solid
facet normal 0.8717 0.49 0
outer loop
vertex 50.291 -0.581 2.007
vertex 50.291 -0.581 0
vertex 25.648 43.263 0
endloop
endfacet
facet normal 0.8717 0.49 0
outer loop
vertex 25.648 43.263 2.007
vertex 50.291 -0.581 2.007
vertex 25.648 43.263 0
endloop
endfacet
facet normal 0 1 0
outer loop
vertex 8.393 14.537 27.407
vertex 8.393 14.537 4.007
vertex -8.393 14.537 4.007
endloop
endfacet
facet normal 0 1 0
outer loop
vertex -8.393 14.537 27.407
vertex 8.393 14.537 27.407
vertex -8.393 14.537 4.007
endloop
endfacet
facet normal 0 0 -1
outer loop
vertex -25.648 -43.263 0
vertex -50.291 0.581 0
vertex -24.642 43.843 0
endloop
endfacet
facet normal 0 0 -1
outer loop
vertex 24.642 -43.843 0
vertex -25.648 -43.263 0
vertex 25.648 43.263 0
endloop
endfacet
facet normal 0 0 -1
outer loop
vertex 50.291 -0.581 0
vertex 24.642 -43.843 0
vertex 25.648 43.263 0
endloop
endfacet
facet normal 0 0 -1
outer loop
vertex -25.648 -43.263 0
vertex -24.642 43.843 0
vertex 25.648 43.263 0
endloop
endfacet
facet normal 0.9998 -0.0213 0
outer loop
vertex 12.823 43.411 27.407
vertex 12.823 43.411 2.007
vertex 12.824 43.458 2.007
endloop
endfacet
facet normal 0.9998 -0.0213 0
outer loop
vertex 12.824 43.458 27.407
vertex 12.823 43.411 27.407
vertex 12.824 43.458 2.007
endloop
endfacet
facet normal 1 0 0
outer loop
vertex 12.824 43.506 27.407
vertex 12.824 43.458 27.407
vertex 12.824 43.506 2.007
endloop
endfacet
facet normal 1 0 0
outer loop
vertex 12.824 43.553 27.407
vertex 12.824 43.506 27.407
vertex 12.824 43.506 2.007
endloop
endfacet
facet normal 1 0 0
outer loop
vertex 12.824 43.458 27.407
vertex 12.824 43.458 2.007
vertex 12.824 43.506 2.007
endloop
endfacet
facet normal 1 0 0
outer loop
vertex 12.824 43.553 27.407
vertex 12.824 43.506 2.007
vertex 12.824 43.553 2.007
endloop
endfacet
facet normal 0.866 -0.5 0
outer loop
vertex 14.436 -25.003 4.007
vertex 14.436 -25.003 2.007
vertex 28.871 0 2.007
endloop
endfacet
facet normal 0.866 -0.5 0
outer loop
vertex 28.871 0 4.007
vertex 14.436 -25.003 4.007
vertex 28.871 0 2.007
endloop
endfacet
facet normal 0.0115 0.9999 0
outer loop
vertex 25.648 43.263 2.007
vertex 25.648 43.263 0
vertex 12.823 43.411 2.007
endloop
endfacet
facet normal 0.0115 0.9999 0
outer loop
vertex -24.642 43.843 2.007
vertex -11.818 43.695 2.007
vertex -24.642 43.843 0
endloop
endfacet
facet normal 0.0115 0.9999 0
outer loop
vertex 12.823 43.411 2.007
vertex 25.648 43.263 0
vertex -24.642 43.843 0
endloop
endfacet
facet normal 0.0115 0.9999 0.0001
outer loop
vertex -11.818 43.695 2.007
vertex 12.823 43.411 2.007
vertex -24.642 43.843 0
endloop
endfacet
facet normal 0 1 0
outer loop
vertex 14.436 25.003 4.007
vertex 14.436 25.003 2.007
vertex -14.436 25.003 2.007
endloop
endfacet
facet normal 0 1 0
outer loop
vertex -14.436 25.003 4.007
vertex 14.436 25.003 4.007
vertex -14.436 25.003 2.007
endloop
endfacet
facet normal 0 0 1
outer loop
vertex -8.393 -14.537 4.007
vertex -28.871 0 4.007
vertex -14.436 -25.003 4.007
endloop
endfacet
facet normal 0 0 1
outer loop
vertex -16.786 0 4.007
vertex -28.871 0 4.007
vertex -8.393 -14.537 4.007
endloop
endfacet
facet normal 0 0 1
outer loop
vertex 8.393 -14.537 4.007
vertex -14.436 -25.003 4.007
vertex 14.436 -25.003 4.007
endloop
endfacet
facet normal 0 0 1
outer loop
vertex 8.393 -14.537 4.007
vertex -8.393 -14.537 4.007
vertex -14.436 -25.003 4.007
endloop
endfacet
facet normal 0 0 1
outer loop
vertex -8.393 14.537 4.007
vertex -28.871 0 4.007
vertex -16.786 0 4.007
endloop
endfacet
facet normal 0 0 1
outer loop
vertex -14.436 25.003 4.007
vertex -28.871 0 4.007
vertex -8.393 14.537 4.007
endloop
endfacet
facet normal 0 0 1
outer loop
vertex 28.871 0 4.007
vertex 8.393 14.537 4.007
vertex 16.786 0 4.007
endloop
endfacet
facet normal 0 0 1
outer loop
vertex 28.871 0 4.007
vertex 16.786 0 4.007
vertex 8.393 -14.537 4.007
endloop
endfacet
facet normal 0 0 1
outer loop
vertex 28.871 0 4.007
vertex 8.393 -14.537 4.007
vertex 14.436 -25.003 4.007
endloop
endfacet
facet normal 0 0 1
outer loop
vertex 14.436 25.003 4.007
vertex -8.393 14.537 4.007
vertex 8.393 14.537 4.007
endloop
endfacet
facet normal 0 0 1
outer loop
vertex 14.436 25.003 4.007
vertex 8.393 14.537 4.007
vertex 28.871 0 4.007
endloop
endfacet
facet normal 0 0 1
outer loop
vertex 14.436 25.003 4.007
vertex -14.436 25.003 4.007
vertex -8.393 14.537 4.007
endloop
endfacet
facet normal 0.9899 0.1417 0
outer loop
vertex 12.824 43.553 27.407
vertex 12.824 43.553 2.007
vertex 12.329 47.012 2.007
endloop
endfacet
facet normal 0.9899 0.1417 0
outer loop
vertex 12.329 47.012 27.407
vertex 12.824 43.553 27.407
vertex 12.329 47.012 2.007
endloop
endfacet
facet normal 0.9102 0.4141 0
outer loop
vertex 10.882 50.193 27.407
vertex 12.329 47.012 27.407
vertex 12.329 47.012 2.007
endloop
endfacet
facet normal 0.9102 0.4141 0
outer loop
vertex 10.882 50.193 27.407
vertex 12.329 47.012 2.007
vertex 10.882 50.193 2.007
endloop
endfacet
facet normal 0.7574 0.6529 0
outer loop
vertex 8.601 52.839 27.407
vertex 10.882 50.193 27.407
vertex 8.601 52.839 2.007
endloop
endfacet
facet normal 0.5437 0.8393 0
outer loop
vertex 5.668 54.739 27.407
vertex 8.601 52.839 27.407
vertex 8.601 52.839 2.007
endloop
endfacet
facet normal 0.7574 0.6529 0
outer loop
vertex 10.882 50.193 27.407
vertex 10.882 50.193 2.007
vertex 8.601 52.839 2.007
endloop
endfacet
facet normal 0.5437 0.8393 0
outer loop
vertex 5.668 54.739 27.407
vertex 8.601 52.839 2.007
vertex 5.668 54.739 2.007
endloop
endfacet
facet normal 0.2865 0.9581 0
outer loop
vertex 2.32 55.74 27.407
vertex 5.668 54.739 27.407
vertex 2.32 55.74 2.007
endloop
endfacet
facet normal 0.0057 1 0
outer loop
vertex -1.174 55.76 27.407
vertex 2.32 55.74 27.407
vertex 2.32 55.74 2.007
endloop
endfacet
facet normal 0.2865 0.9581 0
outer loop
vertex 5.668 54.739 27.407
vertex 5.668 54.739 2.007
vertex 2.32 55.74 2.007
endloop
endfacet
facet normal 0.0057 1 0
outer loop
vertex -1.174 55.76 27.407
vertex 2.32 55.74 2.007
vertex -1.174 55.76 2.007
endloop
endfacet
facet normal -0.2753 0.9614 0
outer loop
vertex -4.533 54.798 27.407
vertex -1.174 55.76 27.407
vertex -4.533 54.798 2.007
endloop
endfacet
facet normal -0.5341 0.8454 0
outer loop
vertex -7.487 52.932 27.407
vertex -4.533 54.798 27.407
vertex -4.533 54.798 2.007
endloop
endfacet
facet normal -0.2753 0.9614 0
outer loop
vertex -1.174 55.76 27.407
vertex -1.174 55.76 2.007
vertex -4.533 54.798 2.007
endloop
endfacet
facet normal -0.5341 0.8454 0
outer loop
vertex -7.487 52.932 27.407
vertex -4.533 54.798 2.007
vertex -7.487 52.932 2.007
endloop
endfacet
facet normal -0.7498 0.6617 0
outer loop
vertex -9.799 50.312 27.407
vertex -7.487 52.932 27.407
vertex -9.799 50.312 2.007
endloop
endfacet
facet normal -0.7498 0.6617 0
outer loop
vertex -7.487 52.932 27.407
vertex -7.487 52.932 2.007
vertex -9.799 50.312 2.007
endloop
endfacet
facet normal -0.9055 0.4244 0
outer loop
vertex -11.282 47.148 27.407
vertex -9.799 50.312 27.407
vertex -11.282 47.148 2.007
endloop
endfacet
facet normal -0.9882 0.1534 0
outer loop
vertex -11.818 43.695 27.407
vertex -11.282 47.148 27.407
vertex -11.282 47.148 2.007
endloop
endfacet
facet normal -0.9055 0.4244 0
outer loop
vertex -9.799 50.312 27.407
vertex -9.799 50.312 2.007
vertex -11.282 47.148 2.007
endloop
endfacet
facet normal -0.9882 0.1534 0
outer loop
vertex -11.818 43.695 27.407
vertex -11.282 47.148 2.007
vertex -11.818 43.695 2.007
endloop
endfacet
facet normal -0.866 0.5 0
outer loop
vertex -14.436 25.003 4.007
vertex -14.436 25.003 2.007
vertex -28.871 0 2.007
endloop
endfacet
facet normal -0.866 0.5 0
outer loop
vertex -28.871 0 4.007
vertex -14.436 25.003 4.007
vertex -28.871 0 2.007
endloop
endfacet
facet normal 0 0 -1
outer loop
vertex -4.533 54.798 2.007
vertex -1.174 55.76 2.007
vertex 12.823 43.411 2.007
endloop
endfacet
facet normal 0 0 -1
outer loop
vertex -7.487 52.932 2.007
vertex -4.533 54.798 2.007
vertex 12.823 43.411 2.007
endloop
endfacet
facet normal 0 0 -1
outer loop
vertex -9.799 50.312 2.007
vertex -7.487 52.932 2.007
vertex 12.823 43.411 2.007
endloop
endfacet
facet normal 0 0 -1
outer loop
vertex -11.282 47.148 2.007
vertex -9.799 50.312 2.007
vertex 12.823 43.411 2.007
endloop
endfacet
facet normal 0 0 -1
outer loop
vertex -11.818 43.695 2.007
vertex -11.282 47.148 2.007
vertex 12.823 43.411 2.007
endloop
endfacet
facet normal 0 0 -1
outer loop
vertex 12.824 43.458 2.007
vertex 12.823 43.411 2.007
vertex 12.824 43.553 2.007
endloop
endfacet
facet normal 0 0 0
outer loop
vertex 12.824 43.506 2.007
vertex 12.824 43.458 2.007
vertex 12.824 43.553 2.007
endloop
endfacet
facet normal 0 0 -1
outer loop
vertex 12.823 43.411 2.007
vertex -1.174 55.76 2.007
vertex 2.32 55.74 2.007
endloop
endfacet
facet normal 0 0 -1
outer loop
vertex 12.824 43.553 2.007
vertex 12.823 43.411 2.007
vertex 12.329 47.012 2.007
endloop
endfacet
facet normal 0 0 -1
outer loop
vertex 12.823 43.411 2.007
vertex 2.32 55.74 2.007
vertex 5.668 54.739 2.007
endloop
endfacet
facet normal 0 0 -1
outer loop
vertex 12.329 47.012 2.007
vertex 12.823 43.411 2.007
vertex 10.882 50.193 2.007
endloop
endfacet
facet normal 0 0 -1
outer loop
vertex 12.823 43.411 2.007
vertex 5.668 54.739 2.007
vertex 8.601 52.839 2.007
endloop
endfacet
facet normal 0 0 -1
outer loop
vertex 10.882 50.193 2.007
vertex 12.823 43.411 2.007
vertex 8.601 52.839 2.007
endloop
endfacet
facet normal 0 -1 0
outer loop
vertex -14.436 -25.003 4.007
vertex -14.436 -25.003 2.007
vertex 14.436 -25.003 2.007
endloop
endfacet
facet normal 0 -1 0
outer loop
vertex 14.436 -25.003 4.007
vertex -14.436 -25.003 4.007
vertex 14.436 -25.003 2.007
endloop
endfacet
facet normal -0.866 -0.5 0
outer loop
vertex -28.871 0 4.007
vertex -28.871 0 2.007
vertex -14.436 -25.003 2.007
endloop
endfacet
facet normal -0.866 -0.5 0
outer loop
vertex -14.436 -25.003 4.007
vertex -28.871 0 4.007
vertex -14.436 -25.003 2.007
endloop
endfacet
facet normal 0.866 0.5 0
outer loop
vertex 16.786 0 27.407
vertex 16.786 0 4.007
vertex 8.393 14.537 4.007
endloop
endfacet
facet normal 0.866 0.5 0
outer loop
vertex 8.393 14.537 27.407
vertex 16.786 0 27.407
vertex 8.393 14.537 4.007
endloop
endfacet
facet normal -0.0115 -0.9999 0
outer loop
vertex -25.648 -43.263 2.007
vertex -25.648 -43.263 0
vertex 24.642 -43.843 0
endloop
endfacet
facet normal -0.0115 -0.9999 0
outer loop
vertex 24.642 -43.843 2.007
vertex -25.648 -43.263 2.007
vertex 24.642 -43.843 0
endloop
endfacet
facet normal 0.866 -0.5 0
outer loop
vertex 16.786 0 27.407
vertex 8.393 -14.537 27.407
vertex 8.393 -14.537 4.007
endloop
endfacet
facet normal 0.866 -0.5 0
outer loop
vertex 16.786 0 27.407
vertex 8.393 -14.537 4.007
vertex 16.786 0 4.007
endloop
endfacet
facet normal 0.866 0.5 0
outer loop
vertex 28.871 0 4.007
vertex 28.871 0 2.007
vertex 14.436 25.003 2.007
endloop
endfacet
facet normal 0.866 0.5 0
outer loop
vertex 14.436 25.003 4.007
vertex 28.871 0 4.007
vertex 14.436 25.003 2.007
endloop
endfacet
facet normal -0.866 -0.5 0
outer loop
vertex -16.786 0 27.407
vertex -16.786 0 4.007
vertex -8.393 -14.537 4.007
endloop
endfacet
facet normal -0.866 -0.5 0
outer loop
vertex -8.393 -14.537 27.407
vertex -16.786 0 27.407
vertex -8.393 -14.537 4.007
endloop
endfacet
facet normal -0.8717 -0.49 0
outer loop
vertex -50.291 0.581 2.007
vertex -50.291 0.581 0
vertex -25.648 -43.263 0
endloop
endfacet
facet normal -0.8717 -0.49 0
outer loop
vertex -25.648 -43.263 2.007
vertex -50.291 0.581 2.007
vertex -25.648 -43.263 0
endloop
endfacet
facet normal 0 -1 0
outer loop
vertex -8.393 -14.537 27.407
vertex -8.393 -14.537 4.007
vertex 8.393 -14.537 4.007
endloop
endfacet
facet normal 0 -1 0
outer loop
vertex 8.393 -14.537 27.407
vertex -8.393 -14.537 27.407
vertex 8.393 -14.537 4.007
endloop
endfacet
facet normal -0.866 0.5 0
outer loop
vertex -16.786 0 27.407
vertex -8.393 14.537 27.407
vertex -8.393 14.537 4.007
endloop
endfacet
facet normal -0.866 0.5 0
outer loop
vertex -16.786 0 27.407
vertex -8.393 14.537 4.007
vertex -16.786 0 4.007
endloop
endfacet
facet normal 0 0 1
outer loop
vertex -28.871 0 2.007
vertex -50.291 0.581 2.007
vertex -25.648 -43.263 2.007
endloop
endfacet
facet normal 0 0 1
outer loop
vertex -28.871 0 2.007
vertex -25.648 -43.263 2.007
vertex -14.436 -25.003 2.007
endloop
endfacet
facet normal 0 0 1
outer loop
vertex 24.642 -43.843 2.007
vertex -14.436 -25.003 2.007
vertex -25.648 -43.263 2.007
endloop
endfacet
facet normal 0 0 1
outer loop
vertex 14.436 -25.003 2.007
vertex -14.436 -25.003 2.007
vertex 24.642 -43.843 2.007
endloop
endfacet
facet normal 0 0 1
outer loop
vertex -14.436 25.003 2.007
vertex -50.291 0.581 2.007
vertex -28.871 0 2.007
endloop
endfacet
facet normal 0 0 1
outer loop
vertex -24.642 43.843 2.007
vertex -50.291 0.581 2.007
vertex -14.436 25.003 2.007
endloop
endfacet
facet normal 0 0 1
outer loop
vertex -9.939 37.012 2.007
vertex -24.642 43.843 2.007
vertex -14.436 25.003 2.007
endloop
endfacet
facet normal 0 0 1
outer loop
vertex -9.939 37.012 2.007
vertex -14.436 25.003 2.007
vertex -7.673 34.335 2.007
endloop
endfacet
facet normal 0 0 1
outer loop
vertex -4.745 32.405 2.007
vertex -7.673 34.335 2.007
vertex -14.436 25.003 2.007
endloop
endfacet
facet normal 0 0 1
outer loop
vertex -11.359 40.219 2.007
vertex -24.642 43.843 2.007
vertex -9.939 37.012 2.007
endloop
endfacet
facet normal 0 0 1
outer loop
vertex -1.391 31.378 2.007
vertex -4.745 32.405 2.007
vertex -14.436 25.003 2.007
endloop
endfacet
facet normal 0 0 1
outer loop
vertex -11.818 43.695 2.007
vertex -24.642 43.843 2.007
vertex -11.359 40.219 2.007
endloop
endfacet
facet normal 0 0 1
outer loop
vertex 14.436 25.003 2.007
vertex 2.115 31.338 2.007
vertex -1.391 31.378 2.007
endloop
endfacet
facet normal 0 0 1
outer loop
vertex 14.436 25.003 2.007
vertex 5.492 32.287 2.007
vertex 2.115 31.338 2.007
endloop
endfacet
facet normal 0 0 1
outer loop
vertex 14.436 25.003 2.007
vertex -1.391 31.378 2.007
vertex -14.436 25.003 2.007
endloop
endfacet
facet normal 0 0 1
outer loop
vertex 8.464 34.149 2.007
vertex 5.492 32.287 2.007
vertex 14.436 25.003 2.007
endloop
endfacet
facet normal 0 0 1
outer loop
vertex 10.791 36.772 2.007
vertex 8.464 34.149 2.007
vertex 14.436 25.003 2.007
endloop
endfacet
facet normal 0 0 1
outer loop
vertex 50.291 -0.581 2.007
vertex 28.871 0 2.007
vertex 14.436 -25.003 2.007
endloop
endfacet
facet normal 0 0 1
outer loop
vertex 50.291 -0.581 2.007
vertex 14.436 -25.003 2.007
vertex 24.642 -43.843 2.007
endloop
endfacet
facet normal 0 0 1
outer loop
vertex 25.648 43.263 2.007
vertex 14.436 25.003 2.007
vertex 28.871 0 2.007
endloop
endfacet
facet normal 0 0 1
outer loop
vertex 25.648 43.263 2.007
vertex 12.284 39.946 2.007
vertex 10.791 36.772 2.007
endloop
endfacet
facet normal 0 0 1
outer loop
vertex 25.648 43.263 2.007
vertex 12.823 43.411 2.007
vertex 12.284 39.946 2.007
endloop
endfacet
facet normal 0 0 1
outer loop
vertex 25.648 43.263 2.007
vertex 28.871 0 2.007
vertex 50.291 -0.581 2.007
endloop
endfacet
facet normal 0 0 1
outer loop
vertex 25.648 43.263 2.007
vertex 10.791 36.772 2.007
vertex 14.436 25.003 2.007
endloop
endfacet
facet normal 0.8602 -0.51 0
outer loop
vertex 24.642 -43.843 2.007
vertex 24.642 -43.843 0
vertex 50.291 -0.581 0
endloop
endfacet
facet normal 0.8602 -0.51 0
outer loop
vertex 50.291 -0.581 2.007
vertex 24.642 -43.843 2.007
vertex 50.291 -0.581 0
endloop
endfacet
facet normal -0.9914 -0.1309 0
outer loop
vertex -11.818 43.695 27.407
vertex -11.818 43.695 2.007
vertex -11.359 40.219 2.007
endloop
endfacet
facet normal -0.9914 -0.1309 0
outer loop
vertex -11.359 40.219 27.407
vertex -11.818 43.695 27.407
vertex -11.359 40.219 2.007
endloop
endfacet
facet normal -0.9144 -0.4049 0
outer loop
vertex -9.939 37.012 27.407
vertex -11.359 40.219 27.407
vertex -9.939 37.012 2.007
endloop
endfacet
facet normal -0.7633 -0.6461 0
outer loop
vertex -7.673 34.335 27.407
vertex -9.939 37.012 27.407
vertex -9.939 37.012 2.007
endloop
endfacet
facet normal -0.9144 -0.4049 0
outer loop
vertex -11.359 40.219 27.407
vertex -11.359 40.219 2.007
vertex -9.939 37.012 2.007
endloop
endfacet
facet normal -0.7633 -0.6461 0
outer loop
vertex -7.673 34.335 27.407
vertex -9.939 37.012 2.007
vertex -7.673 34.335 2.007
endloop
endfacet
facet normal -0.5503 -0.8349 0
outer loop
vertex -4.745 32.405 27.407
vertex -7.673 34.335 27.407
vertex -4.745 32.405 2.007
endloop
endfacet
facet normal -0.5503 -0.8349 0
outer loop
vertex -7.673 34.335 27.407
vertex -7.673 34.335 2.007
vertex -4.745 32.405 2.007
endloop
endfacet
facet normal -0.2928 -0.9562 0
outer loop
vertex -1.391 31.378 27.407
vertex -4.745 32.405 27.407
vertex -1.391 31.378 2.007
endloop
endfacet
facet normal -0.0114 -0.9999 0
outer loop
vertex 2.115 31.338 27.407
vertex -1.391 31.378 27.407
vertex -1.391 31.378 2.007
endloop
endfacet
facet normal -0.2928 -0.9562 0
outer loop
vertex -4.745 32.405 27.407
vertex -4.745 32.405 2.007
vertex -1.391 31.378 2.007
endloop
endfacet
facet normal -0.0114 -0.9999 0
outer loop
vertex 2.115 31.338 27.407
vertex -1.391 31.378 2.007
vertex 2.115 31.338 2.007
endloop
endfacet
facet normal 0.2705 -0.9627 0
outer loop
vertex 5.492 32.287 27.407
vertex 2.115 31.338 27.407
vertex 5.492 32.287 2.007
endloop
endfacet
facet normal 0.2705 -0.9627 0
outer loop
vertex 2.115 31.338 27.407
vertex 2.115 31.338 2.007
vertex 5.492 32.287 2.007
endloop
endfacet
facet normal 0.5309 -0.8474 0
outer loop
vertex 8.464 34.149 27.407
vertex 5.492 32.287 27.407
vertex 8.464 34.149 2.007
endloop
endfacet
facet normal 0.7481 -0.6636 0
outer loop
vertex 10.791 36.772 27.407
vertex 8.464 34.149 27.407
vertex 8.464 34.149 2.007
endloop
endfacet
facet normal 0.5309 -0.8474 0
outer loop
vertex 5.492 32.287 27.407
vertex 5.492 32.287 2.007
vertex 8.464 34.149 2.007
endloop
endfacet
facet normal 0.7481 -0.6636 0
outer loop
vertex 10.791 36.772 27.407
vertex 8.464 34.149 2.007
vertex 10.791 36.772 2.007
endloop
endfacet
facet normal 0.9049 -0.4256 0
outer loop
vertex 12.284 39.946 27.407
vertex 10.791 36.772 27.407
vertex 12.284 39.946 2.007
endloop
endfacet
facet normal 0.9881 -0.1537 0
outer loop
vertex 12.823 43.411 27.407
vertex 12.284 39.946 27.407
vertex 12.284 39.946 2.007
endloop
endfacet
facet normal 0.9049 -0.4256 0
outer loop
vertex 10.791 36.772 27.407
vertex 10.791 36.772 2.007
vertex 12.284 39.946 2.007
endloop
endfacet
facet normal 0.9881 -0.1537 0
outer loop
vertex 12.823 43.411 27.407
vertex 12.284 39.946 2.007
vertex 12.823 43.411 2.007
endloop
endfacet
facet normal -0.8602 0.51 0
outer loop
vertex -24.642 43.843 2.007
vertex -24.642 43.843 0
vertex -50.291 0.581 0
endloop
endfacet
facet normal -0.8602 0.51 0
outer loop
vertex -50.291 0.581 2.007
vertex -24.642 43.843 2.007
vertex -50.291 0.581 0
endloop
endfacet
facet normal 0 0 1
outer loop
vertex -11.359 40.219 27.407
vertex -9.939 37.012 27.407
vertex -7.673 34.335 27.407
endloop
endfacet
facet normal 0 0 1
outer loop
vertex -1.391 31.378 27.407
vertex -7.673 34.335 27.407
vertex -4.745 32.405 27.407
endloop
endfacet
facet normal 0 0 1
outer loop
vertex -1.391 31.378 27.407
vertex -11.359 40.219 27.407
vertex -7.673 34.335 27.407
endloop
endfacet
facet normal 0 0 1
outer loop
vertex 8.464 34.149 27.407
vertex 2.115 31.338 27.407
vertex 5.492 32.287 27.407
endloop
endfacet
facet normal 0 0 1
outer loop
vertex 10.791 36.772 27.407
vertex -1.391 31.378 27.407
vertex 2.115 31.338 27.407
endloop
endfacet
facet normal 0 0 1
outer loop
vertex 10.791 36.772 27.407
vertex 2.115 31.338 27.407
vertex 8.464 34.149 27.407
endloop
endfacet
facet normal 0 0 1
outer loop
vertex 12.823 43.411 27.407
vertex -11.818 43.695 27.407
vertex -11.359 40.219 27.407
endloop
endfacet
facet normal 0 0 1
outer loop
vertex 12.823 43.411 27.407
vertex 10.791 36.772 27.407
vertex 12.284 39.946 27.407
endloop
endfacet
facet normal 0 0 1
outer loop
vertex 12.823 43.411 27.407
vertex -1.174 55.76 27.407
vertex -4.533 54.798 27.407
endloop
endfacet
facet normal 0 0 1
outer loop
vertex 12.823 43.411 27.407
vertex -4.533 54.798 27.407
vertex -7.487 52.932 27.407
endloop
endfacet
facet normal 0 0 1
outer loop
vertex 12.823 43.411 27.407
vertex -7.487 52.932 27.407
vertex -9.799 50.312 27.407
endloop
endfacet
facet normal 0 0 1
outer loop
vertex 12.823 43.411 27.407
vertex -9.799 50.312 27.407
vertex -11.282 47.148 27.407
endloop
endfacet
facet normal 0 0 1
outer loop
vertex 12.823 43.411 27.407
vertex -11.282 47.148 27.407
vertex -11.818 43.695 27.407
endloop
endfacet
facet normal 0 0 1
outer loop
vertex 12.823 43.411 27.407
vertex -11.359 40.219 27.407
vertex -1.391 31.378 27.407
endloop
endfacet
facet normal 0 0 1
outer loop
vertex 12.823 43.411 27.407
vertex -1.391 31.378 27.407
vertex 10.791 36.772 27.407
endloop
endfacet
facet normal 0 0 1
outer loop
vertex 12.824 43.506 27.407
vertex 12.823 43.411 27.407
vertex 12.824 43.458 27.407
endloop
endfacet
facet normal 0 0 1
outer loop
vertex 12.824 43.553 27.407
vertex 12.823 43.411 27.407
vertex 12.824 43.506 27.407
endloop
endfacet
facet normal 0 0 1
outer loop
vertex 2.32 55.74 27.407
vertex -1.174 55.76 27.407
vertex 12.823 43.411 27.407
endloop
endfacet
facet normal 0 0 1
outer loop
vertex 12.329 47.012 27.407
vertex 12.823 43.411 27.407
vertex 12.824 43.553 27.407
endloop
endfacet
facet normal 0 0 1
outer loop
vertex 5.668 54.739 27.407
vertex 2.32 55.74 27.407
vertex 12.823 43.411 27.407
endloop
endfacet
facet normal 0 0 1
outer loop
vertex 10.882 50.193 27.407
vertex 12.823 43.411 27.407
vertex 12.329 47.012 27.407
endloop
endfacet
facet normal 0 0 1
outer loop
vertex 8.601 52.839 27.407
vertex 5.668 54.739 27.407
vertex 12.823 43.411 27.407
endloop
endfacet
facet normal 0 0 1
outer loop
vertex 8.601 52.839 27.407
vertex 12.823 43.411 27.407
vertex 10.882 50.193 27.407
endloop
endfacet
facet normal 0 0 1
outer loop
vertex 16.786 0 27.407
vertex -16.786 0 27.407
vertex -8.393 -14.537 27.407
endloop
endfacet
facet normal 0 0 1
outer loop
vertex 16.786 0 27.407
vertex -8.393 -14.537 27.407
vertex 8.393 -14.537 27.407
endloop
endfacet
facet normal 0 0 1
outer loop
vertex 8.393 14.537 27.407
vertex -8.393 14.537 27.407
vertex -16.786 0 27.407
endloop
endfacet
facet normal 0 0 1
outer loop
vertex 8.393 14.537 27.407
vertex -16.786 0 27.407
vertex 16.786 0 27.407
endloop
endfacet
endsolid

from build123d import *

# Parameters (mm, degrees)
F1_DEPTH = 2.0066
F3_DEPTH = 2
F5_DEPTH = 25.4


with BuildPart() as f1:
    # F0 (on Top) → F1 (new body)
    with BuildSketch(Plane.XY):
        Polygon((-24.6424870433, 43.8434540713), (-50.2907885371, 0.5807072437), (-25.6483014937, -43.2627468276), (24.6424870433, -43.8434540713), (50.2907885371, -0.5807072437), (25.6483014937, 43.2627468276), align=None)
    extrude(amount=F1_DEPTH)

    # F2 (on face) → F3 (join)
    with BuildSketch(Plane.XY.offset(2.0066)):
        Polygon((14.4355614638, 25.0031258911), (-14.4355614638, 25.0031258911), (-28.8711229276, 0), (-14.4355614638, -25.0031258911), (14.4355614638, -25.0031258911), (28.8711229276, 0), align=None)
    extrude(amount=F3_DEPTH)

    # F4 (on face) → F5 (join)
    with BuildSketch(Plane.XY.offset(2.0066)):
        Polygon((8.3927677802, 14.5367002115), (-8.3927677802, 14.5367002115), (-16.7855355604, 0), (-8.3927677802, -14.5367002115), (8.3927677802, -14.5367002115), (16.7855355604, 0), align=None)
        with BuildLine():
            Line((12.8234216162, 43.4108355902), (-11.8176071658, 43.6953653087))
            ThreePointArc((-11.8176071658, 43.6953653087), (0.3606423659, 31.2325860584), (12.8234216162, 43.4108355902))
        make_face()
        with BuildLine():
            ThreePointArc((12.8234216162, 43.4108355902), (12.8240376181, 43.4819668344), (12.8242429543, 43.5531004494))
            ThreePointArc((12.8242429543, 43.5531004494), (0.5740408403, 55.8742308423), (-11.8176071658, 43.6953653087))
            Line((-11.8176071658, 43.6953653087), (12.8234216162, 43.4108355902))
        make_face()
    extrude(amount=F5_DEPTH)


solid = f1.part
